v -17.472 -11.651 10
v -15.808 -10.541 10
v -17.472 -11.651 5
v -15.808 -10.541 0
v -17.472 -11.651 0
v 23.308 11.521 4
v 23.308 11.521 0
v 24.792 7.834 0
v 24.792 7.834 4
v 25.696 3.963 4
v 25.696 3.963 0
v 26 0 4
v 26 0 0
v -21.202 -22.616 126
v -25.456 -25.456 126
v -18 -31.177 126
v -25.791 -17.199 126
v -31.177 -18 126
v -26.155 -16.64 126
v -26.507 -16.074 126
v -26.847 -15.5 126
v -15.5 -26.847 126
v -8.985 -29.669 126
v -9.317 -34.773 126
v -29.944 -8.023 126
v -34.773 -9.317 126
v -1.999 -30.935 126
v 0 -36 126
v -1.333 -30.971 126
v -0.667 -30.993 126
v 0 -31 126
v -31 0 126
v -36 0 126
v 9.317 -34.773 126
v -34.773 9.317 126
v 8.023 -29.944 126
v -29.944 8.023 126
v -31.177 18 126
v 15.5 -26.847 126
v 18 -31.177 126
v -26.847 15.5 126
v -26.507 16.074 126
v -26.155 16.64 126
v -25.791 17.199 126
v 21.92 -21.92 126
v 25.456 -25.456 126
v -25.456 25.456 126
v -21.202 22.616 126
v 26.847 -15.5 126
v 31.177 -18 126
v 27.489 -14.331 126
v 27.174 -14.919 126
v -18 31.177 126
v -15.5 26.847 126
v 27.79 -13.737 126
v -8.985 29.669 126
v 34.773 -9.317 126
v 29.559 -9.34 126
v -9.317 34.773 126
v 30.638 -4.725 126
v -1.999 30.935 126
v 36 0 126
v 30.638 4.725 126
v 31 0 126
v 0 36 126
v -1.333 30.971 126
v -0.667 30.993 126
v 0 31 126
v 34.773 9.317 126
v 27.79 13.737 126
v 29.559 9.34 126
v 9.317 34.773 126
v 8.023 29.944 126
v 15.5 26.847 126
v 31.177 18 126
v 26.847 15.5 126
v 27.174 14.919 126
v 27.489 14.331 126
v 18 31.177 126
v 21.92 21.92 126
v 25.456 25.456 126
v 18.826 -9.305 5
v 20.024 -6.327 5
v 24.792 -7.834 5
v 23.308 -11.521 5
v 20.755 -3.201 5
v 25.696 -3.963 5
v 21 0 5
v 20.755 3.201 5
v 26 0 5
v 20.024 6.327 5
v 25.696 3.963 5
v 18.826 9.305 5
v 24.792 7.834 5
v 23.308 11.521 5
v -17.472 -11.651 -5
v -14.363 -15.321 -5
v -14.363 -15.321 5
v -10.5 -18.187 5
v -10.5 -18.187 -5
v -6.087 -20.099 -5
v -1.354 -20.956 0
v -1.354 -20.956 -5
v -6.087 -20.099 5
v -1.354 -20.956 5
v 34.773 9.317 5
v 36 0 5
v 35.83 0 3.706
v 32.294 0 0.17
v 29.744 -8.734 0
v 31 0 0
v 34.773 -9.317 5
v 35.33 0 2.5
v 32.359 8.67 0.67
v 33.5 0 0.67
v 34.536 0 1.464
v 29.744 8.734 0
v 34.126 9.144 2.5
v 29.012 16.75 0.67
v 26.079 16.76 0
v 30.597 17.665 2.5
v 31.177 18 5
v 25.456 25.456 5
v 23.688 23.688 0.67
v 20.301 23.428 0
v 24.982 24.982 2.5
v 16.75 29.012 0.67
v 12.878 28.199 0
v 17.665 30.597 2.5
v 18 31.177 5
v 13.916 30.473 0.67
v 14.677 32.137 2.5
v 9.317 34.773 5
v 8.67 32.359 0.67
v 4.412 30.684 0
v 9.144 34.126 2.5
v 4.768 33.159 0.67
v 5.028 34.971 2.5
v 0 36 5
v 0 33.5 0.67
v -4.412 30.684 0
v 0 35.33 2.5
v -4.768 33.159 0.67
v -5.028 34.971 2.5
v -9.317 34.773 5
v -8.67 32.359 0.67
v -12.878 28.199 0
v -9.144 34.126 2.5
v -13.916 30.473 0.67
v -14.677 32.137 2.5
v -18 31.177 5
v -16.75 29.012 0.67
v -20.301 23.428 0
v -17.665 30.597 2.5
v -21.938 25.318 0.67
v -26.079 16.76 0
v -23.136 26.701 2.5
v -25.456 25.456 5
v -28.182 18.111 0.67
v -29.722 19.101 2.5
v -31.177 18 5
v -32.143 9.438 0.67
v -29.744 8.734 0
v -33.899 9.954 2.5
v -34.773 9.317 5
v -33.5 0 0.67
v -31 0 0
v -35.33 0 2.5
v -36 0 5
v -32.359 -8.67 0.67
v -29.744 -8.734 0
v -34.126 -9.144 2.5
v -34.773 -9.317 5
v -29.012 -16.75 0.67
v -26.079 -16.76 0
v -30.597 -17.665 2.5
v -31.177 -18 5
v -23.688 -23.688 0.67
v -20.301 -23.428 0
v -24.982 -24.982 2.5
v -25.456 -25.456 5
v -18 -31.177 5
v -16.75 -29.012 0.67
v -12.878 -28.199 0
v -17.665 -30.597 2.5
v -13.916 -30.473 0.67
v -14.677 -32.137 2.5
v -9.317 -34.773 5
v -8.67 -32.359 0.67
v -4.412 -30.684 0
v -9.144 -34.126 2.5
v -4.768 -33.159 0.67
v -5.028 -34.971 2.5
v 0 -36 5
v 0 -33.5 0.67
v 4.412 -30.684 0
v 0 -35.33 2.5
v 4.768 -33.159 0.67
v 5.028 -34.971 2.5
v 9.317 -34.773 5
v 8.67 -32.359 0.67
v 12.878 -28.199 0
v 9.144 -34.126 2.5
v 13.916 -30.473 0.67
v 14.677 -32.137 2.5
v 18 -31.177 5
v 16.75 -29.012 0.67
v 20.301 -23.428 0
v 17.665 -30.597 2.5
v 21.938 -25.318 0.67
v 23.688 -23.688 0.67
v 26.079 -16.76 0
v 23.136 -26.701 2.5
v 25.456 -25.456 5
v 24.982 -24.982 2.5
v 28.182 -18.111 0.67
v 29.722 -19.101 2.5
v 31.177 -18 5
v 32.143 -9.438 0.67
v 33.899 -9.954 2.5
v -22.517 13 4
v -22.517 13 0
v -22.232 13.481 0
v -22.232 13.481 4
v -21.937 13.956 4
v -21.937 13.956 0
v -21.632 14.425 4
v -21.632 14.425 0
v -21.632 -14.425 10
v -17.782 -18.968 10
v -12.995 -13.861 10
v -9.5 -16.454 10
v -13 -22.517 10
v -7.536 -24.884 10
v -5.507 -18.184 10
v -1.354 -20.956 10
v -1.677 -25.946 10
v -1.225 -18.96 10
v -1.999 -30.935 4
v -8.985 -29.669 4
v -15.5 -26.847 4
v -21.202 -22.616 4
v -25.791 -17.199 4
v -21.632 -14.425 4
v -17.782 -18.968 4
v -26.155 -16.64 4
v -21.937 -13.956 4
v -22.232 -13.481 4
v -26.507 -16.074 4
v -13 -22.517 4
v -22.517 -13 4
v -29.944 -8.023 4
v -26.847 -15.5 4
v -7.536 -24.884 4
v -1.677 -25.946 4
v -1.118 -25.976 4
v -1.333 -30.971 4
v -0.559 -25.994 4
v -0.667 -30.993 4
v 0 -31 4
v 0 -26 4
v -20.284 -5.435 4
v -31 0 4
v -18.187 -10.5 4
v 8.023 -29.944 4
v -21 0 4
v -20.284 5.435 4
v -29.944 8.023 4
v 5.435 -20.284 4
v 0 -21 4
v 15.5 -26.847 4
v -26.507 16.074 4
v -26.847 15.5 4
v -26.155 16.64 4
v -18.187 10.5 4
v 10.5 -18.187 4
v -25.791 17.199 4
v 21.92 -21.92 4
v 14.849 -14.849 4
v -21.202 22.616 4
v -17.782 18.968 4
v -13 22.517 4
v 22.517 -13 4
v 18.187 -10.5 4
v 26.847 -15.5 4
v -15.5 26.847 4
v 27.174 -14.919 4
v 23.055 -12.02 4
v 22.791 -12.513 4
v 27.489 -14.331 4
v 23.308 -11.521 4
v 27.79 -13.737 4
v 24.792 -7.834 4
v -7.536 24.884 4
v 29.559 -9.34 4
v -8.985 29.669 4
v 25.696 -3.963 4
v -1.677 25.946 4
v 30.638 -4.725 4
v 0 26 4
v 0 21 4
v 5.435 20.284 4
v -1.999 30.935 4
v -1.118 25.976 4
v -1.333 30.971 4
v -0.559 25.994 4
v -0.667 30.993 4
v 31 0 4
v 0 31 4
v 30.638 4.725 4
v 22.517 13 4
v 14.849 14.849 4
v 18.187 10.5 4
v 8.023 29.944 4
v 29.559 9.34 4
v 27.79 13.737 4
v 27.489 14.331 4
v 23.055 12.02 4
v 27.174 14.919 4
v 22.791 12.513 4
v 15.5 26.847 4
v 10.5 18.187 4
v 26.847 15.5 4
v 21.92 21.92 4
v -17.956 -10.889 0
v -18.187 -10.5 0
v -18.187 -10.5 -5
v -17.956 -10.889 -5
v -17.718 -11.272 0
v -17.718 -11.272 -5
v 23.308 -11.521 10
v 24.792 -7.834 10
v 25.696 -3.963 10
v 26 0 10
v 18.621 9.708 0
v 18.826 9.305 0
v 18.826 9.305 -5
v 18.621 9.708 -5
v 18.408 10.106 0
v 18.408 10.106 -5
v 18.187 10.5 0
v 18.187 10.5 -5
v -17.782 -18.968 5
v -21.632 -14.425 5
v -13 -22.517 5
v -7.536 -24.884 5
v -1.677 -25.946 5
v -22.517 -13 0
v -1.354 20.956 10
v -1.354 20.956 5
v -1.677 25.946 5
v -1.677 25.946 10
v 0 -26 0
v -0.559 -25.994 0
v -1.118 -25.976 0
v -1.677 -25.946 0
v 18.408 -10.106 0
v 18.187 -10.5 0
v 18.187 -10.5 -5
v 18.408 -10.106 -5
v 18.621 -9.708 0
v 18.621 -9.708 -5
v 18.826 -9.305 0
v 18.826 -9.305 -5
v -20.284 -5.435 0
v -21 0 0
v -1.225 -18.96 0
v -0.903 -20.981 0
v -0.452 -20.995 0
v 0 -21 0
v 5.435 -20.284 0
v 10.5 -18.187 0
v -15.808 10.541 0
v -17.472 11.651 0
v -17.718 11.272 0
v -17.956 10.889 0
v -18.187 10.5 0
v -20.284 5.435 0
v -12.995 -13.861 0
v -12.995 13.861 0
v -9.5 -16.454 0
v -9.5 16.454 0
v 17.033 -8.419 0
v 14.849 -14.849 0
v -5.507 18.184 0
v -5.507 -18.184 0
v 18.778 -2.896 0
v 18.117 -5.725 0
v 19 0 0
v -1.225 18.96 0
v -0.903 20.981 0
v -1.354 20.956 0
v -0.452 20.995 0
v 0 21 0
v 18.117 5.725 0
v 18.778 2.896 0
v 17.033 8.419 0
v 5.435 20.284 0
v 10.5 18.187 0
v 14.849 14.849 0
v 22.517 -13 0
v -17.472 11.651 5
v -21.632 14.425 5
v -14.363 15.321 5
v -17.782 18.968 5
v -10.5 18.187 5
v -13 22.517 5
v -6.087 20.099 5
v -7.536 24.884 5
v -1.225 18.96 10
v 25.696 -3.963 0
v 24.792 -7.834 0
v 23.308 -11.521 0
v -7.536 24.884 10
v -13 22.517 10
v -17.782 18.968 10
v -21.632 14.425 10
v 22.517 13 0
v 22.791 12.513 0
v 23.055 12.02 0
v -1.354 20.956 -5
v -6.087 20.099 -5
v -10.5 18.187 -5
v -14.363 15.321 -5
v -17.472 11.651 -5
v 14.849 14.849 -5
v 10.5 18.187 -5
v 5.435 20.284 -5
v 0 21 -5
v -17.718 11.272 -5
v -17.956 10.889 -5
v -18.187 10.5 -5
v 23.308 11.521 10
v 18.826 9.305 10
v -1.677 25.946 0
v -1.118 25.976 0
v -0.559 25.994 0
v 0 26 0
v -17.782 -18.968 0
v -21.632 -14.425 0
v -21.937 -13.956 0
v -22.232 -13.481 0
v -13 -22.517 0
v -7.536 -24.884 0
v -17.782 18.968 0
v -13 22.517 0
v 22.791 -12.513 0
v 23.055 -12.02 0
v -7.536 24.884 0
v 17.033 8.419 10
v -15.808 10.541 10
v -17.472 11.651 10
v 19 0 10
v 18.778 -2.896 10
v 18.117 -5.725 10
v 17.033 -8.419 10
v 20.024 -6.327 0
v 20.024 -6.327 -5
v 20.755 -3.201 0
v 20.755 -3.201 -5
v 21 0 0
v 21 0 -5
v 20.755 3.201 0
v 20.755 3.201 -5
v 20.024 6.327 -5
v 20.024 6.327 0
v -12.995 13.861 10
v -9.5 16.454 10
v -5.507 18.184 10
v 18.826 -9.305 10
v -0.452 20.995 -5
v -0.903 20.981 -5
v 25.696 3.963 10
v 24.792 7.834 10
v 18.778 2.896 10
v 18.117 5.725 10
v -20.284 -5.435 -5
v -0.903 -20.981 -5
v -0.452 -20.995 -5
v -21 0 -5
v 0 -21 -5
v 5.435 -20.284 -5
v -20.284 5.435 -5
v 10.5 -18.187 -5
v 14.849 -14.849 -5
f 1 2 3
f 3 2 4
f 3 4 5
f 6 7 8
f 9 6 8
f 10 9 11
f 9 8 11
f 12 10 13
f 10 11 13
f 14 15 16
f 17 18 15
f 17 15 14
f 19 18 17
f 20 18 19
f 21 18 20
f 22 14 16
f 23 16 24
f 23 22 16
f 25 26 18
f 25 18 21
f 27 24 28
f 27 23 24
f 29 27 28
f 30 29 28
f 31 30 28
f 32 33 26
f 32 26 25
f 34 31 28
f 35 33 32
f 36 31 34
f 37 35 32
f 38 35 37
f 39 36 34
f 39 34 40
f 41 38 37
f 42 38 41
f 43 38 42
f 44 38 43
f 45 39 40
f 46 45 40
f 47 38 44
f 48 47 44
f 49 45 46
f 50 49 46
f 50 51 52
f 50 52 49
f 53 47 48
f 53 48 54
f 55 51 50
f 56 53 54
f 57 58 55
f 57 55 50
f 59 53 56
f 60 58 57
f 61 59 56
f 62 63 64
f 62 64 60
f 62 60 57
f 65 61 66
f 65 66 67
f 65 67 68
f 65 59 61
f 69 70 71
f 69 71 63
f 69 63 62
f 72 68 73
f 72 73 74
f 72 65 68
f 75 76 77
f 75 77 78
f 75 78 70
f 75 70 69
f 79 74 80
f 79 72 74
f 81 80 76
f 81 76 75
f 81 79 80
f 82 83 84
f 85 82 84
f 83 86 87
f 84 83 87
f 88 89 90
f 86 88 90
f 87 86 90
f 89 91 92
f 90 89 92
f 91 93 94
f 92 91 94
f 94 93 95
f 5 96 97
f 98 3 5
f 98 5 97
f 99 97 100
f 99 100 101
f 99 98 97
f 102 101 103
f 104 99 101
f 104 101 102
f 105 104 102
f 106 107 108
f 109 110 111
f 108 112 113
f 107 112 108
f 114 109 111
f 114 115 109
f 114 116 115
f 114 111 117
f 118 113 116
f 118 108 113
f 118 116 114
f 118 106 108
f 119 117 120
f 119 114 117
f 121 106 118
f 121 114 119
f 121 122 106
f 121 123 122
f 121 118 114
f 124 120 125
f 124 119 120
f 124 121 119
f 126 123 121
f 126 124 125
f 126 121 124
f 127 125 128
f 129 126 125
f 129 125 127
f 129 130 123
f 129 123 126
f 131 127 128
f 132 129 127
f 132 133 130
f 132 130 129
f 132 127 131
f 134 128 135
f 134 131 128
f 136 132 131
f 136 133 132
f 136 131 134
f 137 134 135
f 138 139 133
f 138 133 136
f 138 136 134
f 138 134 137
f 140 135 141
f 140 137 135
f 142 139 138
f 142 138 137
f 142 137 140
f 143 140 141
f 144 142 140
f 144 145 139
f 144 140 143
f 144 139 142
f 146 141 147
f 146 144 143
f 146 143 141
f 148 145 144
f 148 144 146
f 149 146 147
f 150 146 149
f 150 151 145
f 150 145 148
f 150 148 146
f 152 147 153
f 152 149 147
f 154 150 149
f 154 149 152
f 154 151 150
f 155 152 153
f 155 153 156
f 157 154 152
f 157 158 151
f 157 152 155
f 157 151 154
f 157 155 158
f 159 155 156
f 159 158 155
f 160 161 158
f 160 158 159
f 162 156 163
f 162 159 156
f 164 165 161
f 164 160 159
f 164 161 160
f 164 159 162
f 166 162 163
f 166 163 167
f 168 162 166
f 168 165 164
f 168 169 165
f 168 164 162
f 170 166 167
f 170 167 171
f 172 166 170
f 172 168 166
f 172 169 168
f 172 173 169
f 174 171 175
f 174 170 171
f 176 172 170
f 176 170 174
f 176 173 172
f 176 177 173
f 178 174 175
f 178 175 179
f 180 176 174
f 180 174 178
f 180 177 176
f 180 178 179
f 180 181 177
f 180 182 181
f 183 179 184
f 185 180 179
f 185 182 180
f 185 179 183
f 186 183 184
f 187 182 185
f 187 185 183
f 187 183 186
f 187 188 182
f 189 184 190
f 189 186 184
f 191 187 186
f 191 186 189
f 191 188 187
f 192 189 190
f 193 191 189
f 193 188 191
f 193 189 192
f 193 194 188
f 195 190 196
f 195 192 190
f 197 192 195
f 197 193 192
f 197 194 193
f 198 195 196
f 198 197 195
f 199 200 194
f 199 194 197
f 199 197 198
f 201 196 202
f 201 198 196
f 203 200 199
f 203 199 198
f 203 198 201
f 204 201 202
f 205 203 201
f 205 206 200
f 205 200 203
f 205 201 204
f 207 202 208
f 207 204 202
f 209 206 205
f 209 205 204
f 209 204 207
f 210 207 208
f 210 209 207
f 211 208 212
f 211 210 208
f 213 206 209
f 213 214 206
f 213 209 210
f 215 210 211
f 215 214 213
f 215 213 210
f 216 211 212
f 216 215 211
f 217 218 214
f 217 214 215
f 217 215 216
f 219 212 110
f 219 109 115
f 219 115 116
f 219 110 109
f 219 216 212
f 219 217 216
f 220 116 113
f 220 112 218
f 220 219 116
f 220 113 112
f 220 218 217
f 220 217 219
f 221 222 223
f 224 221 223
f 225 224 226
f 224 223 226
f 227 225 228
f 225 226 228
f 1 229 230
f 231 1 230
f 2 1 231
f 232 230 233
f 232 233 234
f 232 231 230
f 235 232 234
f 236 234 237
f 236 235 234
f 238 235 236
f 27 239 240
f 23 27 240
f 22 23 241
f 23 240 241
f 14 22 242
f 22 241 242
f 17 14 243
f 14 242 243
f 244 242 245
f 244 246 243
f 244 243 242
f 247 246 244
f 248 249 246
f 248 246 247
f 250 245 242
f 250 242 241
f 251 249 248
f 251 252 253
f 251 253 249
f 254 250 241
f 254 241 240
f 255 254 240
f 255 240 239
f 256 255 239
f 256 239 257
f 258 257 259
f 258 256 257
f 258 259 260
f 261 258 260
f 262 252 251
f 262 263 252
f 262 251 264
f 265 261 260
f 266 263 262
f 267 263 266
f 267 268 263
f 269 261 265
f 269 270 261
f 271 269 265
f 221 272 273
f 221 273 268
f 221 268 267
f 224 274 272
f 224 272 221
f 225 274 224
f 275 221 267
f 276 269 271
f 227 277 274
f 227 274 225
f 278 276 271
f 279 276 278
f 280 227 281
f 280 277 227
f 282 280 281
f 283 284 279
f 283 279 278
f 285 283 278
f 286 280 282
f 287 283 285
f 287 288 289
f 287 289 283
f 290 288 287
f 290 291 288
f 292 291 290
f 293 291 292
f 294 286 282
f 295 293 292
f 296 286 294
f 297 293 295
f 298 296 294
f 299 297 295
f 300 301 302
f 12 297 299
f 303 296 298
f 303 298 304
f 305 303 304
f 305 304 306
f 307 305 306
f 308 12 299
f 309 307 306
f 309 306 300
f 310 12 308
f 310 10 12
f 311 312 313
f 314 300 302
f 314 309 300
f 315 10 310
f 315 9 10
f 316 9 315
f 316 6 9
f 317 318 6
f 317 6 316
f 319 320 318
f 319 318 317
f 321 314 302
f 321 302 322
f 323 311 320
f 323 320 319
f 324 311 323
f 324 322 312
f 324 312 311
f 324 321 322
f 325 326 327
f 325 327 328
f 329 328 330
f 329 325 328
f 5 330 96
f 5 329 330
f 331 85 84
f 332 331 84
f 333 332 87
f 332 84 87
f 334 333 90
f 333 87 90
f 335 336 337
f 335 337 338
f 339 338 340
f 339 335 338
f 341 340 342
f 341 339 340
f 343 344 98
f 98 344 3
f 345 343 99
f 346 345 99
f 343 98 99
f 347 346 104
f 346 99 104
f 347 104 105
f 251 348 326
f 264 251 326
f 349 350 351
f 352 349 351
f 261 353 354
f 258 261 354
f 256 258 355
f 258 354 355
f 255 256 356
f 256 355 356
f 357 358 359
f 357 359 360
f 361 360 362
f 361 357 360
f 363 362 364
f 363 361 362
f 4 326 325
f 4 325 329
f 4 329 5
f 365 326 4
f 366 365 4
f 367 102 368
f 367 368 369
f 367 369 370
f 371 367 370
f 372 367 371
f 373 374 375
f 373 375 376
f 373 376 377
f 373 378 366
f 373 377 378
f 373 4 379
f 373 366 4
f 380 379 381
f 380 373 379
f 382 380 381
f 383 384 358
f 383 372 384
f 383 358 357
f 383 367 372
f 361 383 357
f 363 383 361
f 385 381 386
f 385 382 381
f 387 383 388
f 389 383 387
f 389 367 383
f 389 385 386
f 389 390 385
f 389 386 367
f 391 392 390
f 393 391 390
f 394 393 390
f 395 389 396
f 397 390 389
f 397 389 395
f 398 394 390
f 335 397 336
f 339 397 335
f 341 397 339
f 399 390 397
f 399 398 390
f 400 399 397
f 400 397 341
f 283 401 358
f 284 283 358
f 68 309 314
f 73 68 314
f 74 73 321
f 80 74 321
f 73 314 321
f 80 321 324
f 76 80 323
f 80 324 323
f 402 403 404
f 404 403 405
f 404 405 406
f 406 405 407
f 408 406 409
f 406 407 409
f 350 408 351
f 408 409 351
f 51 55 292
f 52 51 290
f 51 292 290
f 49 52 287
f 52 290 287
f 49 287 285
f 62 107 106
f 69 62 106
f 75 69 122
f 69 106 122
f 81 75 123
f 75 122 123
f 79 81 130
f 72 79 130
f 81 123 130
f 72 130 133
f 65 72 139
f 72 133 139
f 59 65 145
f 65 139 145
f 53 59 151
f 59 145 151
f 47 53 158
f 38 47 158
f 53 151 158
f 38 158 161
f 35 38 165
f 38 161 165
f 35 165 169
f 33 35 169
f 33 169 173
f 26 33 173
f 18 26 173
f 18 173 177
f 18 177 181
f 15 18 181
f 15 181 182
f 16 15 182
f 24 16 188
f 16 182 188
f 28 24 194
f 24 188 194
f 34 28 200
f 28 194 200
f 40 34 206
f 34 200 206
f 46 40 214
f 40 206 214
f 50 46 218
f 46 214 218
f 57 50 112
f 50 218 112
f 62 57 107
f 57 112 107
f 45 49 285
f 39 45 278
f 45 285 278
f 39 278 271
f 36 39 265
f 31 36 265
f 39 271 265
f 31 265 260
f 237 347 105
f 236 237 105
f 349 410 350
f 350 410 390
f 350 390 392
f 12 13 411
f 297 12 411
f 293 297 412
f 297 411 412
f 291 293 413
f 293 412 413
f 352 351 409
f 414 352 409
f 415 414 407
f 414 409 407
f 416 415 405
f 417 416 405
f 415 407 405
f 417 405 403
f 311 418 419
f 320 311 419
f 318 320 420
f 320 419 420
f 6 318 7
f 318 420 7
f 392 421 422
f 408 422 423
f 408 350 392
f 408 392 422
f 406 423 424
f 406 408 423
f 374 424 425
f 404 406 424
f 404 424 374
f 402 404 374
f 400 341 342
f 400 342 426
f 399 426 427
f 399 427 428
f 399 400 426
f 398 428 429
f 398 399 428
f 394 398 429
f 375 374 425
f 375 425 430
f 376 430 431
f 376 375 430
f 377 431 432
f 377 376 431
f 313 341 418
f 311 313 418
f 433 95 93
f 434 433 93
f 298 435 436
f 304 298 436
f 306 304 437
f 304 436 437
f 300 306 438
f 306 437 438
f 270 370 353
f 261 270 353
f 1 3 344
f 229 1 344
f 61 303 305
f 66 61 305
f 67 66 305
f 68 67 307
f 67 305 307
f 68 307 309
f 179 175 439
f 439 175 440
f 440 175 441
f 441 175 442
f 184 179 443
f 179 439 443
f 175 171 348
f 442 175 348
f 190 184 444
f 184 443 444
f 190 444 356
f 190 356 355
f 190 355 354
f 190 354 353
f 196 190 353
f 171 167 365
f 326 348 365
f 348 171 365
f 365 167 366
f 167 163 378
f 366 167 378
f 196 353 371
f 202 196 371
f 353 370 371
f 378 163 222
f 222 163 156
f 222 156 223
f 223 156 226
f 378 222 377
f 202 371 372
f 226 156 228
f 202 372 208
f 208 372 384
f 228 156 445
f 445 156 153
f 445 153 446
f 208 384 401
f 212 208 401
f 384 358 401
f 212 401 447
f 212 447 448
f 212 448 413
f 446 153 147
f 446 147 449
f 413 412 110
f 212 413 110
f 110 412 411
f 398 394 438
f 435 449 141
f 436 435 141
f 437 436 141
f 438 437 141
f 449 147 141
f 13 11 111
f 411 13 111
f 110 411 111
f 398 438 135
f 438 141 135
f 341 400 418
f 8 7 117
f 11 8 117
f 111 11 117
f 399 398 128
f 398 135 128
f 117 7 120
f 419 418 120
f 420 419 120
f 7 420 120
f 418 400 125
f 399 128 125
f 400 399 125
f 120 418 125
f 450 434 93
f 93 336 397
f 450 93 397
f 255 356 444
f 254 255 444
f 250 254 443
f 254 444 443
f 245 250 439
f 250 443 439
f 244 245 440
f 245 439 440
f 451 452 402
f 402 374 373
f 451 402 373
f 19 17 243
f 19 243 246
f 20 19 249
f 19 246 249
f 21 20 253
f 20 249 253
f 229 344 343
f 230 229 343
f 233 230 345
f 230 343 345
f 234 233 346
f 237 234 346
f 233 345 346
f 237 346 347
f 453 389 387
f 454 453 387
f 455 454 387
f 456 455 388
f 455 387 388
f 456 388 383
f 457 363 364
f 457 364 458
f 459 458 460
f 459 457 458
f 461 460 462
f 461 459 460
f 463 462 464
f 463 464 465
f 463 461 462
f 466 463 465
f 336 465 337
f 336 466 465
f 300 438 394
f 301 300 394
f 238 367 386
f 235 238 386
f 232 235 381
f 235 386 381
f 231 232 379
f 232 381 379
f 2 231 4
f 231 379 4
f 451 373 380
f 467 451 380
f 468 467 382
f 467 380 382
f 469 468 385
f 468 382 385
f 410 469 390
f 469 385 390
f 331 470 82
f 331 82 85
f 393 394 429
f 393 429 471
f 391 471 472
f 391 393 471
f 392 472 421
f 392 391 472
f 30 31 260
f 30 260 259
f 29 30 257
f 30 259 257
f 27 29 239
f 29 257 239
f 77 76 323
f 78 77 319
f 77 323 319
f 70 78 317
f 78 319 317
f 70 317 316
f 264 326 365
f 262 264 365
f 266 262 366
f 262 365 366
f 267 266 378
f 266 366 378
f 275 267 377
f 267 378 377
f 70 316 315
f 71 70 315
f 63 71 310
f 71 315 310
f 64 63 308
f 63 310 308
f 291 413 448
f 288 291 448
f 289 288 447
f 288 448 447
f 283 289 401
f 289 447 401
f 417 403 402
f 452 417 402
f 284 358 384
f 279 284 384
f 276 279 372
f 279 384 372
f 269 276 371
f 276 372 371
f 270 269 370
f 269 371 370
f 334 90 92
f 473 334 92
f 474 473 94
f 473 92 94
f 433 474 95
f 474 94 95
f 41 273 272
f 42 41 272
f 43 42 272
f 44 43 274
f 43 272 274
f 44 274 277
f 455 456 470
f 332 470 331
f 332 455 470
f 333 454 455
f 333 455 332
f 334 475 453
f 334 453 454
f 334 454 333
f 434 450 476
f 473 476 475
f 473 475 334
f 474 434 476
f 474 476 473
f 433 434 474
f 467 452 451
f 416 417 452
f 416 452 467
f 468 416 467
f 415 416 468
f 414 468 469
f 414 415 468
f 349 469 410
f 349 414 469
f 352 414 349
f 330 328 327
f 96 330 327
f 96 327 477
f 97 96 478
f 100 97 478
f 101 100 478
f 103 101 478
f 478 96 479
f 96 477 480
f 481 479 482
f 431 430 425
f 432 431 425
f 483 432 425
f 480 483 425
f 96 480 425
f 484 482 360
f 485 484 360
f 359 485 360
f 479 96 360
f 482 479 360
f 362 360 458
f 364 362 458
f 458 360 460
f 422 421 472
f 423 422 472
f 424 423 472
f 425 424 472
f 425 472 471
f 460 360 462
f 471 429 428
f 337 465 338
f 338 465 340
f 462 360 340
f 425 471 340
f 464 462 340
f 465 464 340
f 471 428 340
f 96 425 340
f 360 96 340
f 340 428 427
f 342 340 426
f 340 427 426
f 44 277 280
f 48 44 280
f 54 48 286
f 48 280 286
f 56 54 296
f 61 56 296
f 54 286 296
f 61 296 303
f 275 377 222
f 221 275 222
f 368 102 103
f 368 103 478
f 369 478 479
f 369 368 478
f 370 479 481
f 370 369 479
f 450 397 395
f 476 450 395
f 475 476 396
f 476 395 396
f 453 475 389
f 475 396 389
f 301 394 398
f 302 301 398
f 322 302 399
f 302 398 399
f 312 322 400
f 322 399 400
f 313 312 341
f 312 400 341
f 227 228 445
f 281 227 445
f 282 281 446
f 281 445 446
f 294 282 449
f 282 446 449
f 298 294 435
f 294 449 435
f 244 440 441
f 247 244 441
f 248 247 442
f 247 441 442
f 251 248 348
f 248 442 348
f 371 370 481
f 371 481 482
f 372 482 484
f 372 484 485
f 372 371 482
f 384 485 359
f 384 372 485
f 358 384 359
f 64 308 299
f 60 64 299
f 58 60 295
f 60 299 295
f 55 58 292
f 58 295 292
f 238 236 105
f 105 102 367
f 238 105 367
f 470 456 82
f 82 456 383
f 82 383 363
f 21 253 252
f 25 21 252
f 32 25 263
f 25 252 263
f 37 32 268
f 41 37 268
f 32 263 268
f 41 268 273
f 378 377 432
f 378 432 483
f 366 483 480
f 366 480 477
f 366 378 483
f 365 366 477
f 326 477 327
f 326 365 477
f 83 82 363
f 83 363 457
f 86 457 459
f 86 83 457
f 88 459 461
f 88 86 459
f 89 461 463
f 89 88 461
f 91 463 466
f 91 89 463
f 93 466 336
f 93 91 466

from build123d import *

# Parameters (mm, degrees)
F0_R     = 36
F1_DEPTH = 126
F2_DEPTH = 4
F3_R     = 5
F4_DEPTH = 10
F5_DEPTH = 5
F6_DEPTH = 5


# Not quite as in the source:
# - a feature names something its author has since deleted; it is built from what else it names


with BuildPart() as f1:
    # F0 (on Top) → F1 (new body)
    with BuildSketch(Plane.XY):
        Circle(F0_R)
        with BuildLine():
            ThreePointArc((27.7903944838, 13.7365925335), (30.1869361562, 7.0532889846), (31, 0))
            ThreePointArc((31, 0), (30.1869361562, -7.0532889846), (27.7903944838, -13.7365925335))
            ThreePointArc((27.7903944838, -13.7365925335), (27.33281573, -14.625907981), (26.8467875173, -15.5))
            ThreePointArc((26.8467875173, -15.5), (15.5, -26.8467875173), (0, -31))
            ThreePointArc((0, -31), (-1, -30.9838667697), (-1.9989591464, -30.935483871))
            ThreePointArc((-1.9989591464, -30.935483871), (-15.5, -26.8467875173), (-25.7914353374, -17.1988913374))
            ThreePointArc((-25.7914353374, -17.1988913374), (-26.33281573, -16.3579587886), (-26.8467875173, -15.5))
            ThreePointArc((-26.8467875173, -15.5), (-31, 0), (-26.8467875173, 15.5))
            ThreePointArc((-26.8467875173, 15.5), (-26.33281573, 16.3579587886), (-25.7914353374, 17.1988913374))
            ThreePointArc((-25.7914353374, 17.1988913374), (-15.5, 26.8467875173), (-1.9989591464, 30.935483871))
            ThreePointArc((-1.9989591464, 30.935483871), (-1, 30.9838667697), (0, 31))
            ThreePointArc((0, 31), (15.5, 26.8467875173), (26.8467875173, 15.5))
            ThreePointArc((26.8467875173, 15.5), (27.33281573, 14.625907981), (27.7903944838, 13.7365925335))
        make_face(mode=Mode.SUBTRACT)
    extrude(amount=F1_DEPTH)

    # F0 (on Top) → F2 (join)
    with BuildSketch(Plane.XY):
        with BuildLine():
            ThreePointArc((0, -31), (15.5, -26.8467875173), (26.8467875173, -15.5))
            Line((26.8467875173, -15.5), (22.5166604984, -13))
            ThreePointArc((22.5166604984, -13), (13, -22.5166604984), (0, -26))
            Line((0, -26), (0, -31))
        make_face()
        with BuildLine():
            ThreePointArc((0, -26), (13, -22.5166604984), (22.5166604984, -13))
            Line((22.5166604984, -13), (18.1865334795, -10.5))
            ThreePointArc((18.1865334795, -10.5), (10.5, -18.1865334795), (0, -21))
            Line((0, -21), (0, -26))
        make_face()
        with BuildLine():
            Line((-22.5166604984, 13), (-26.8467875173, 15.5))
            ThreePointArc((-26.8467875173, 15.5), (-31, 0), (-26.8467875173, -15.5))
            Line((-26.8467875173, -15.5), (-22.5166604984, -13))
            ThreePointArc((-22.5166604984, -13), (-26, 0), (-22.5166604984, 13))
        make_face()
        with BuildLine():
            Line((-18.1865334795, 10.5), (-22.5166604984, 13))
            ThreePointArc((-22.5166604984, 13), (-26, 0), (-22.5166604984, -13))
            Line((-22.5166604984, -13), (-18.1865334795, -10.5))
            ThreePointArc((-18.1865334795, -10.5), (-21, 0), (-18.1865334795, 10.5))
        make_face()
        with BuildLine():
            ThreePointArc((-26.8467875173, -15.5), (-26.33281573, -16.3579587886), (-25.7914353374, -17.1988913374))
            Line((-25.7914353374, -17.1988913374), (-21.631526412, -14.4248766056))
            ThreePointArc((-21.631526412, -14.4248766056), (-22.0855873864, -13.7195783388), (-22.5166604984, -13))
            Line((-22.5166604984, -13), (-26.8467875173, -15.5))
        make_face()
        with BuildLine():
            Line((0, 26), (0, 31))
            ThreePointArc((0, 31), (-1, 30.9838667697), (-1.9989591464, 30.935483871))
            Line((-1.9989591464, 30.935483871), (-1.6765463809, 25.9458896982))
            ThreePointArc((-1.6765463809, 25.9458896982), (-0.8387096774, 25.9864689036), (0, 26))
        make_face()
        with BuildLine():
            Line((22.5166604984, 13), (26.8467875173, 15.5))
            ThreePointArc((26.8467875173, 15.5), (15.5, 26.8467875173), (0, 31))
            Line((0, 31), (0, 26))
            ThreePointArc((0, 26), (13, 22.5166604984), (22.5166604984, 13))
        make_face()
        with BuildLine():
            Line((-1.6765463809, 25.9458896982), (-1.9989591464, 30.935483871))
            ThreePointArc((-1.9989591464, 30.935483871), (-15.5, 26.8467875173), (-25.7914353374, 17.1988913374))
            Line((-25.7914353374, 17.1988913374), (-21.631526412, 14.4248766056))
            ThreePointArc((-21.631526412, 14.4248766056), (-13, 22.5166604984), (-1.6765463809, 25.9458896982))
        make_face()
        with BuildLine():
            Line((18.1865334795, 10.5), (22.5166604984, 13))
            ThreePointArc((22.5166604984, 13), (13, 22.5166604984), (0, 26))
            Line((0, 26), (0, 21))
            ThreePointArc((0, 21), (10.5, 18.1865334795), (18.1865334795, 10.5))
        make_face()
        with BuildLine():
            Line((-21.631526412, 14.4248766056), (-25.7914353374, 17.1988913374))
            ThreePointArc((-25.7914353374, 17.1988913374), (-26.33281573, 16.3579587886), (-26.8467875173, 15.5))
            Line((-26.8467875173, 15.5), (-22.5166604984, 13))
            ThreePointArc((-22.5166604984, 13), (-22.0855873864, 13.7195783388), (-21.631526412, 14.4248766056))
        make_face()
        with BuildLine():
            Line((23.3080727929, 11.5210130927), (27.7903944838, 13.7365925335))
            ThreePointArc((27.7903944838, 13.7365925335), (27.33281573, 14.625907981), (26.8467875173, 15.5))
            Line((26.8467875173, 15.5), (22.5166604984, 13))
            ThreePointArc((22.5166604984, 13), (22.9242970639, 12.2668905647), (23.3080727929, 11.5210130927))
        make_face()
        with BuildLine():
            ThreePointArc((27.7903944838, -13.7365925335), (30.1869361562, -7.0532889846), (31, 0))
            ThreePointArc((31, 0), (30.1869361562, 7.0532889846), (27.7903944838, 13.7365925335))
            Line((27.7903944838, 13.7365925335), (23.3080727929, 11.5210130927))
            ThreePointArc((23.3080727929, 11.5210130927), (25.3180754859, 5.915661729), (26, 0))
            ThreePointArc((26, 0), (25.3180754859, -5.915661729), (23.3080727929, -11.5210130927))
            Line((23.3080727929, -11.5210130927), (27.7903944838, -13.7365925335))
        make_face()
        with BuildLine():
            ThreePointArc((26.8467875173, -15.5), (27.33281573, -14.625907981), (27.7903944838, -13.7365925335))
            Line((27.7903944838, -13.7365925335), (23.3080727929, -11.5210130927))
            ThreePointArc((23.3080727929, -11.5210130927), (22.9242970639, -12.2668905647), (22.5166604984, -13))
            Line((22.5166604984, -13), (26.8467875173, -15.5))
        make_face()
        with BuildLine():
            ThreePointArc((-1.9989591464, -30.935483871), (-1, -30.9838667697), (0, -31))
            Line((0, -31), (0, -26))
            ThreePointArc((0, -26), (-0.8387096774, -25.9864689036), (-1.6765463809, -25.9458896982))
            Line((-1.6765463809, -25.9458896982), (-1.9989591464, -30.935483871))
        make_face()
        with BuildLine():
            ThreePointArc((-25.7914353374, -17.1988913374), (-15.5, -26.8467875173), (-1.9989591464, -30.935483871))
            Line((-1.9989591464, -30.935483871), (-1.6765463809, -25.9458896982))
            ThreePointArc((-1.6765463809, -25.9458896982), (-13, -22.5166604984), (-21.631526412, -14.4248766056))
            Line((-21.631526412, -14.4248766056), (-25.7914353374, -17.1988913374))
        make_face()
    extrude(amount=F2_DEPTH)

    # F3
    f3_edges = [f1.edges().sort_by_distance(p)[0] for p in [
        (-36, 0, 0),
    ]]
    fillet(f3_edges, radius=F3_R)



with BuildPart() as f4:
    # F0 (on Top) → F4 (new body)
    with BuildSketch(Plane.XY):
        with BuildLine():
            ThreePointArc((26, 0), (25.3180754859, 5.915661729), (23.3080727929, 11.5210130927))
            Line((23.3080727929, 11.5210130927), (18.825751102, 9.3054336518))
            ThreePointArc((18.825751102, 9.3054336518), (20.4492148155, 4.7780344735), (21, 0))
            ThreePointArc((21, 0), (20.4492148155, -4.7780344735), (18.825751102, -9.3054336518))
            Line((18.825751102, -9.3054336518), (23.3080727929, -11.5210130927))
            ThreePointArc((23.3080727929, -11.5210130927), (25.3180754859, -5.915661729), (26, 0))
        make_face()
        with BuildLine():
            ThreePointArc((-21.631526412, -14.4248766056), (-13, -22.5166604984), (-1.6765463809, -25.9458896982))
            Line((-1.6765463809, -25.9458896982), (-1.3541336153, -20.9562955255))
            ThreePointArc((-1.3541336153, -20.9562955255), (-10.5, -18.1865334795), (-17.4716174866, -11.6508618737))
            Line((-17.4716174866, -11.6508618737), (-21.631526412, -14.4248766056))
        make_face()
        with BuildLine():
            Line((-1.3541336153, 20.9562955255), (-1.6765463809, 25.9458896982))
            ThreePointArc((-1.6765463809, 25.9458896982), (-13, 22.5166604984), (-21.631526412, 14.4248766056))
            Line((-21.631526412, 14.4248766056), (-17.4716174866, 11.6508618737))
            ThreePointArc((-17.4716174866, 11.6508618737), (-10.5, 18.1865334795), (-1.3541336153, 20.9562955255))
        make_face()
        with BuildLine():
            ThreePointArc((-15.8076539165, 10.541255981), (-9.5, 16.4544826719), (-1.2251685091, 18.9604578564))
            Line((-1.2251685091, 18.9604578564), (-1.3541336153, 20.9562955255))
            ThreePointArc((-1.3541336153, 20.9562955255), (-10.5, 18.1865334795), (-17.4716174866, 11.6508618737))
            Line((-17.4716174866, 11.6508618737), (-15.8076539165, 10.541255981))
        make_face()
        with BuildLine():
            Line((-1.3541336153, -20.9562955255), (-1.2251685091, -18.9604578564))
            ThreePointArc((-1.2251685091, -18.9604578564), (-9.5, -16.4544826719), (-15.8076539165, -10.541255981))
            Line((-15.8076539165, -10.541255981), (-17.4716174866, -11.6508618737))
            ThreePointArc((-17.4716174866, -11.6508618737), (-10.5, -18.1865334795), (-1.3541336153, -20.9562955255))
        make_face()
        with BuildLine():
            ThreePointArc((21, 0), (20.4492148155, 4.7780344735), (18.825751102, 9.3054336518))
            Line((18.825751102, 9.3054336518), (17.0328224256, 8.4192018754))
            ThreePointArc((17.0328224256, 8.4192018754), (18.5016705474, 4.3229835712), (19, 0))
            ThreePointArc((19, 0), (18.5016705474, -4.3229835712), (17.0328224256, -8.4192018754))
            Line((17.0328224256, -8.4192018754), (18.825751102, -9.3054336518))
            ThreePointArc((18.825751102, -9.3054336518), (20.4492148155, -4.7780344735), (21, 0))
        make_face()
    extrude(amount=F4_DEPTH)

    # F0 (on Top) → F5 (cut)
    with BuildSketch(Plane.XY):
        with BuildLine():
            ThreePointArc((-21.631526412, -14.4248766056), (-13, -22.5166604984), (-1.6765463809, -25.9458896982))
            Line((-1.6765463809, -25.9458896982), (-1.3541336153, -20.9562955255))
            ThreePointArc((-1.3541336153, -20.9562955255), (-10.5, -18.1865334795), (-17.4716174866, -11.6508618737))
            Line((-17.4716174866, -11.6508618737), (-21.631526412, -14.4248766056))
        make_face()
        with BuildLine():
            ThreePointArc((26, 0), (25.3180754859, 5.915661729), (23.3080727929, 11.5210130927))
            Line((23.3080727929, 11.5210130927), (18.825751102, 9.3054336518))
            ThreePointArc((18.825751102, 9.3054336518), (20.4492148155, 4.7780344735), (21, 0))
            ThreePointArc((21, 0), (20.4492148155, -4.7780344735), (18.825751102, -9.3054336518))
            Line((18.825751102, -9.3054336518), (23.3080727929, -11.5210130927))
            ThreePointArc((23.3080727929, -11.5210130927), (25.3180754859, -5.915661729), (26, 0))
        make_face()
        with BuildLine():
            Line((-1.3541336153, 20.9562955255), (-1.6765463809, 25.9458896982))
            ThreePointArc((-1.6765463809, 25.9458896982), (-13, 22.5166604984), (-21.631526412, 14.4248766056))
            Line((-21.631526412, 14.4248766056), (-17.4716174866, 11.6508618737))
            ThreePointArc((-17.4716174866, 11.6508618737), (-10.5, 18.1865334795), (-1.3541336153, 20.9562955255))
        make_face()
    extrude(amount=F5_DEPTH, mode=Mode.SUBTRACT)


with BuildPart() as f1_1:
    add(f1.part)

    add(f4.part)  # F6 merges F4
    # F0 (on Top) → F6 (join)
    with BuildSketch(Plane.XY):
        with BuildLine():
            Line((-1.2251685091, -18.9604578564), (0, 0))
            Line((0, 0), (-15.8076539165, -10.541255981))
            ThreePointArc((-15.8076539165, -10.541255981), (-9.5, -16.4544826719), (-1.2251685091, -18.9604578564))
        make_face()
        with BuildLine():
            ThreePointArc((-1.2251685091, -18.9604578564), (9.5, -16.4544826719), (17.0328224256, -8.4192018754))
            Line((17.0328224256, -8.4192018754), (0, 0))
            Line((0, 0), (-1.2251685091, -18.9604578564))
        make_face()
        with BuildLine():
            ThreePointArc((19, 0), (18.5016705474, 4.3229835712), (17.0328224256, 8.4192018754))
            Line((17.0328224256, 8.4192018754), (0, 0))
            Line((0, 0), (17.0328224256, -8.4192018754))
            ThreePointArc((17.0328224256, -8.4192018754), (18.5016705474, -4.3229835712), (19, 0))
        make_face()
        with BuildLine():
            Line((0, 0), (17.0328224256, 8.4192018754))
            ThreePointArc((17.0328224256, 8.4192018754), (9.5, 16.4544826719), (-1.2251685091, 18.9604578564))
            Line((-1.2251685091, 18.9604578564), (0, 0))
        make_face()
        with BuildLine():
            Line((0, 0), (-1.2251685091, 18.9604578564))
            ThreePointArc((-1.2251685091, 18.9604578564), (-9.5, 16.4544826719), (-15.8076539165, 10.541255981))
            Line((-15.8076539165, 10.541255981), (0, 0))
        make_face()
        with BuildLine():
            Line((-15.8076539165, -10.541255981), (0, 0))
            Line((0, 0), (-15.8076539165, 10.541255981))
            ThreePointArc((-15.8076539165, 10.541255981), (-19, 0), (-15.8076539165, -10.541255981))
        make_face()
        with BuildLine():
            Line((-1.3541336153, -20.9562955255), (-1.2251685091, -18.9604578564))
            ThreePointArc((-1.2251685091, -18.9604578564), (-9.5, -16.4544826719), (-15.8076539165, -10.541255981))
            Line((-15.8076539165, -10.541255981), (-17.4716174866, -11.6508618737))
            ThreePointArc((-17.4716174866, -11.6508618737), (-10.5, -18.1865334795), (-1.3541336153, -20.9562955255))
        make_face()
        with BuildLine():
            ThreePointArc((18.1865334795, -10.5), (18.5157783977, -9.9078731485), (18.825751102, -9.3054336518))
            Line((18.825751102, -9.3054336518), (17.0328224256, -8.4192018754))
            ThreePointArc((17.0328224256, -8.4192018754), (9.5, -16.4544826719), (-1.2251685091, -18.9604578564))
            Line((-1.2251685091, -18.9604578564), (-1.3541336153, -20.9562955255))
            ThreePointArc((-1.3541336153, -20.9562955255), (-0.6774193548, -20.9890710375), (0, -21))
            ThreePointArc((0, -21), (10.5, -18.1865334795), (18.1865334795, -10.5))
        make_face()
        with BuildLine():
            ThreePointArc((21, 0), (20.4492148155, 4.7780344735), (18.825751102, 9.3054336518))
            Line((18.825751102, 9.3054336518), (17.0328224256, 8.4192018754))
            ThreePointArc((17.0328224256, 8.4192018754), (18.5016705474, 4.3229835712), (19, 0))
            ThreePointArc((19, 0), (18.5016705474, -4.3229835712), (17.0328224256, -8.4192018754))
            Line((17.0328224256, -8.4192018754), (18.825751102, -9.3054336518))
            ThreePointArc((18.825751102, -9.3054336518), (20.4492148155, -4.7780344735), (21, 0))
        make_face()
        with BuildLine():
            Line((17.0328224256, 8.4192018754), (18.825751102, 9.3054336518))
            ThreePointArc((18.825751102, 9.3054336518), (18.5157783977, 9.9078731485), (18.1865334795, 10.5))
            ThreePointArc((18.1865334795, 10.5), (10.5, 18.1865334795), (0, 21))
            ThreePointArc((0, 21), (-0.6774193548, 20.9890710375), (-1.3541336153, 20.9562955255))
            Line((-1.3541336153, 20.9562955255), (-1.2251685091, 18.9604578564))
            ThreePointArc((-1.2251685091, 18.9604578564), (9.5, 16.4544826719), (17.0328224256, 8.4192018754))
        make_face()
        with BuildLine():
            ThreePointArc((-15.8076539165, 10.541255981), (-9.5, 16.4544826719), (-1.2251685091, 18.9604578564))
            Line((-1.2251685091, 18.9604578564), (-1.3541336153, 20.9562955255))
            ThreePointArc((-1.3541336153, 20.9562955255), (-10.5, 18.1865334795), (-17.4716174866, 11.6508618737))
            Line((-17.4716174866, 11.6508618737), (-15.8076539165, 10.541255981))
        make_face()
        with BuildLine():
            ThreePointArc((-15.8076539165, -10.541255981), (-19, 0), (-15.8076539165, 10.541255981))
            Line((-15.8076539165, 10.541255981), (-17.4716174866, 11.6508618737))
            ThreePointArc((-17.4716174866, 11.6508618737), (-17.8383590429, 11.0811978891), (-18.1865334795, 10.5))
            ThreePointArc((-18.1865334795, 10.5), (-21, 0), (-18.1865334795, -10.5))
            ThreePointArc((-18.1865334795, -10.5), (-17.8383590429, -11.0811978891), (-17.4716174866, -11.6508618737))
            Line((-17.4716174866, -11.6508618737), (-15.8076539165, -10.541255981))
        make_face()
    extrude(amount=-F6_DEPTH)


solid = f1_1.part
